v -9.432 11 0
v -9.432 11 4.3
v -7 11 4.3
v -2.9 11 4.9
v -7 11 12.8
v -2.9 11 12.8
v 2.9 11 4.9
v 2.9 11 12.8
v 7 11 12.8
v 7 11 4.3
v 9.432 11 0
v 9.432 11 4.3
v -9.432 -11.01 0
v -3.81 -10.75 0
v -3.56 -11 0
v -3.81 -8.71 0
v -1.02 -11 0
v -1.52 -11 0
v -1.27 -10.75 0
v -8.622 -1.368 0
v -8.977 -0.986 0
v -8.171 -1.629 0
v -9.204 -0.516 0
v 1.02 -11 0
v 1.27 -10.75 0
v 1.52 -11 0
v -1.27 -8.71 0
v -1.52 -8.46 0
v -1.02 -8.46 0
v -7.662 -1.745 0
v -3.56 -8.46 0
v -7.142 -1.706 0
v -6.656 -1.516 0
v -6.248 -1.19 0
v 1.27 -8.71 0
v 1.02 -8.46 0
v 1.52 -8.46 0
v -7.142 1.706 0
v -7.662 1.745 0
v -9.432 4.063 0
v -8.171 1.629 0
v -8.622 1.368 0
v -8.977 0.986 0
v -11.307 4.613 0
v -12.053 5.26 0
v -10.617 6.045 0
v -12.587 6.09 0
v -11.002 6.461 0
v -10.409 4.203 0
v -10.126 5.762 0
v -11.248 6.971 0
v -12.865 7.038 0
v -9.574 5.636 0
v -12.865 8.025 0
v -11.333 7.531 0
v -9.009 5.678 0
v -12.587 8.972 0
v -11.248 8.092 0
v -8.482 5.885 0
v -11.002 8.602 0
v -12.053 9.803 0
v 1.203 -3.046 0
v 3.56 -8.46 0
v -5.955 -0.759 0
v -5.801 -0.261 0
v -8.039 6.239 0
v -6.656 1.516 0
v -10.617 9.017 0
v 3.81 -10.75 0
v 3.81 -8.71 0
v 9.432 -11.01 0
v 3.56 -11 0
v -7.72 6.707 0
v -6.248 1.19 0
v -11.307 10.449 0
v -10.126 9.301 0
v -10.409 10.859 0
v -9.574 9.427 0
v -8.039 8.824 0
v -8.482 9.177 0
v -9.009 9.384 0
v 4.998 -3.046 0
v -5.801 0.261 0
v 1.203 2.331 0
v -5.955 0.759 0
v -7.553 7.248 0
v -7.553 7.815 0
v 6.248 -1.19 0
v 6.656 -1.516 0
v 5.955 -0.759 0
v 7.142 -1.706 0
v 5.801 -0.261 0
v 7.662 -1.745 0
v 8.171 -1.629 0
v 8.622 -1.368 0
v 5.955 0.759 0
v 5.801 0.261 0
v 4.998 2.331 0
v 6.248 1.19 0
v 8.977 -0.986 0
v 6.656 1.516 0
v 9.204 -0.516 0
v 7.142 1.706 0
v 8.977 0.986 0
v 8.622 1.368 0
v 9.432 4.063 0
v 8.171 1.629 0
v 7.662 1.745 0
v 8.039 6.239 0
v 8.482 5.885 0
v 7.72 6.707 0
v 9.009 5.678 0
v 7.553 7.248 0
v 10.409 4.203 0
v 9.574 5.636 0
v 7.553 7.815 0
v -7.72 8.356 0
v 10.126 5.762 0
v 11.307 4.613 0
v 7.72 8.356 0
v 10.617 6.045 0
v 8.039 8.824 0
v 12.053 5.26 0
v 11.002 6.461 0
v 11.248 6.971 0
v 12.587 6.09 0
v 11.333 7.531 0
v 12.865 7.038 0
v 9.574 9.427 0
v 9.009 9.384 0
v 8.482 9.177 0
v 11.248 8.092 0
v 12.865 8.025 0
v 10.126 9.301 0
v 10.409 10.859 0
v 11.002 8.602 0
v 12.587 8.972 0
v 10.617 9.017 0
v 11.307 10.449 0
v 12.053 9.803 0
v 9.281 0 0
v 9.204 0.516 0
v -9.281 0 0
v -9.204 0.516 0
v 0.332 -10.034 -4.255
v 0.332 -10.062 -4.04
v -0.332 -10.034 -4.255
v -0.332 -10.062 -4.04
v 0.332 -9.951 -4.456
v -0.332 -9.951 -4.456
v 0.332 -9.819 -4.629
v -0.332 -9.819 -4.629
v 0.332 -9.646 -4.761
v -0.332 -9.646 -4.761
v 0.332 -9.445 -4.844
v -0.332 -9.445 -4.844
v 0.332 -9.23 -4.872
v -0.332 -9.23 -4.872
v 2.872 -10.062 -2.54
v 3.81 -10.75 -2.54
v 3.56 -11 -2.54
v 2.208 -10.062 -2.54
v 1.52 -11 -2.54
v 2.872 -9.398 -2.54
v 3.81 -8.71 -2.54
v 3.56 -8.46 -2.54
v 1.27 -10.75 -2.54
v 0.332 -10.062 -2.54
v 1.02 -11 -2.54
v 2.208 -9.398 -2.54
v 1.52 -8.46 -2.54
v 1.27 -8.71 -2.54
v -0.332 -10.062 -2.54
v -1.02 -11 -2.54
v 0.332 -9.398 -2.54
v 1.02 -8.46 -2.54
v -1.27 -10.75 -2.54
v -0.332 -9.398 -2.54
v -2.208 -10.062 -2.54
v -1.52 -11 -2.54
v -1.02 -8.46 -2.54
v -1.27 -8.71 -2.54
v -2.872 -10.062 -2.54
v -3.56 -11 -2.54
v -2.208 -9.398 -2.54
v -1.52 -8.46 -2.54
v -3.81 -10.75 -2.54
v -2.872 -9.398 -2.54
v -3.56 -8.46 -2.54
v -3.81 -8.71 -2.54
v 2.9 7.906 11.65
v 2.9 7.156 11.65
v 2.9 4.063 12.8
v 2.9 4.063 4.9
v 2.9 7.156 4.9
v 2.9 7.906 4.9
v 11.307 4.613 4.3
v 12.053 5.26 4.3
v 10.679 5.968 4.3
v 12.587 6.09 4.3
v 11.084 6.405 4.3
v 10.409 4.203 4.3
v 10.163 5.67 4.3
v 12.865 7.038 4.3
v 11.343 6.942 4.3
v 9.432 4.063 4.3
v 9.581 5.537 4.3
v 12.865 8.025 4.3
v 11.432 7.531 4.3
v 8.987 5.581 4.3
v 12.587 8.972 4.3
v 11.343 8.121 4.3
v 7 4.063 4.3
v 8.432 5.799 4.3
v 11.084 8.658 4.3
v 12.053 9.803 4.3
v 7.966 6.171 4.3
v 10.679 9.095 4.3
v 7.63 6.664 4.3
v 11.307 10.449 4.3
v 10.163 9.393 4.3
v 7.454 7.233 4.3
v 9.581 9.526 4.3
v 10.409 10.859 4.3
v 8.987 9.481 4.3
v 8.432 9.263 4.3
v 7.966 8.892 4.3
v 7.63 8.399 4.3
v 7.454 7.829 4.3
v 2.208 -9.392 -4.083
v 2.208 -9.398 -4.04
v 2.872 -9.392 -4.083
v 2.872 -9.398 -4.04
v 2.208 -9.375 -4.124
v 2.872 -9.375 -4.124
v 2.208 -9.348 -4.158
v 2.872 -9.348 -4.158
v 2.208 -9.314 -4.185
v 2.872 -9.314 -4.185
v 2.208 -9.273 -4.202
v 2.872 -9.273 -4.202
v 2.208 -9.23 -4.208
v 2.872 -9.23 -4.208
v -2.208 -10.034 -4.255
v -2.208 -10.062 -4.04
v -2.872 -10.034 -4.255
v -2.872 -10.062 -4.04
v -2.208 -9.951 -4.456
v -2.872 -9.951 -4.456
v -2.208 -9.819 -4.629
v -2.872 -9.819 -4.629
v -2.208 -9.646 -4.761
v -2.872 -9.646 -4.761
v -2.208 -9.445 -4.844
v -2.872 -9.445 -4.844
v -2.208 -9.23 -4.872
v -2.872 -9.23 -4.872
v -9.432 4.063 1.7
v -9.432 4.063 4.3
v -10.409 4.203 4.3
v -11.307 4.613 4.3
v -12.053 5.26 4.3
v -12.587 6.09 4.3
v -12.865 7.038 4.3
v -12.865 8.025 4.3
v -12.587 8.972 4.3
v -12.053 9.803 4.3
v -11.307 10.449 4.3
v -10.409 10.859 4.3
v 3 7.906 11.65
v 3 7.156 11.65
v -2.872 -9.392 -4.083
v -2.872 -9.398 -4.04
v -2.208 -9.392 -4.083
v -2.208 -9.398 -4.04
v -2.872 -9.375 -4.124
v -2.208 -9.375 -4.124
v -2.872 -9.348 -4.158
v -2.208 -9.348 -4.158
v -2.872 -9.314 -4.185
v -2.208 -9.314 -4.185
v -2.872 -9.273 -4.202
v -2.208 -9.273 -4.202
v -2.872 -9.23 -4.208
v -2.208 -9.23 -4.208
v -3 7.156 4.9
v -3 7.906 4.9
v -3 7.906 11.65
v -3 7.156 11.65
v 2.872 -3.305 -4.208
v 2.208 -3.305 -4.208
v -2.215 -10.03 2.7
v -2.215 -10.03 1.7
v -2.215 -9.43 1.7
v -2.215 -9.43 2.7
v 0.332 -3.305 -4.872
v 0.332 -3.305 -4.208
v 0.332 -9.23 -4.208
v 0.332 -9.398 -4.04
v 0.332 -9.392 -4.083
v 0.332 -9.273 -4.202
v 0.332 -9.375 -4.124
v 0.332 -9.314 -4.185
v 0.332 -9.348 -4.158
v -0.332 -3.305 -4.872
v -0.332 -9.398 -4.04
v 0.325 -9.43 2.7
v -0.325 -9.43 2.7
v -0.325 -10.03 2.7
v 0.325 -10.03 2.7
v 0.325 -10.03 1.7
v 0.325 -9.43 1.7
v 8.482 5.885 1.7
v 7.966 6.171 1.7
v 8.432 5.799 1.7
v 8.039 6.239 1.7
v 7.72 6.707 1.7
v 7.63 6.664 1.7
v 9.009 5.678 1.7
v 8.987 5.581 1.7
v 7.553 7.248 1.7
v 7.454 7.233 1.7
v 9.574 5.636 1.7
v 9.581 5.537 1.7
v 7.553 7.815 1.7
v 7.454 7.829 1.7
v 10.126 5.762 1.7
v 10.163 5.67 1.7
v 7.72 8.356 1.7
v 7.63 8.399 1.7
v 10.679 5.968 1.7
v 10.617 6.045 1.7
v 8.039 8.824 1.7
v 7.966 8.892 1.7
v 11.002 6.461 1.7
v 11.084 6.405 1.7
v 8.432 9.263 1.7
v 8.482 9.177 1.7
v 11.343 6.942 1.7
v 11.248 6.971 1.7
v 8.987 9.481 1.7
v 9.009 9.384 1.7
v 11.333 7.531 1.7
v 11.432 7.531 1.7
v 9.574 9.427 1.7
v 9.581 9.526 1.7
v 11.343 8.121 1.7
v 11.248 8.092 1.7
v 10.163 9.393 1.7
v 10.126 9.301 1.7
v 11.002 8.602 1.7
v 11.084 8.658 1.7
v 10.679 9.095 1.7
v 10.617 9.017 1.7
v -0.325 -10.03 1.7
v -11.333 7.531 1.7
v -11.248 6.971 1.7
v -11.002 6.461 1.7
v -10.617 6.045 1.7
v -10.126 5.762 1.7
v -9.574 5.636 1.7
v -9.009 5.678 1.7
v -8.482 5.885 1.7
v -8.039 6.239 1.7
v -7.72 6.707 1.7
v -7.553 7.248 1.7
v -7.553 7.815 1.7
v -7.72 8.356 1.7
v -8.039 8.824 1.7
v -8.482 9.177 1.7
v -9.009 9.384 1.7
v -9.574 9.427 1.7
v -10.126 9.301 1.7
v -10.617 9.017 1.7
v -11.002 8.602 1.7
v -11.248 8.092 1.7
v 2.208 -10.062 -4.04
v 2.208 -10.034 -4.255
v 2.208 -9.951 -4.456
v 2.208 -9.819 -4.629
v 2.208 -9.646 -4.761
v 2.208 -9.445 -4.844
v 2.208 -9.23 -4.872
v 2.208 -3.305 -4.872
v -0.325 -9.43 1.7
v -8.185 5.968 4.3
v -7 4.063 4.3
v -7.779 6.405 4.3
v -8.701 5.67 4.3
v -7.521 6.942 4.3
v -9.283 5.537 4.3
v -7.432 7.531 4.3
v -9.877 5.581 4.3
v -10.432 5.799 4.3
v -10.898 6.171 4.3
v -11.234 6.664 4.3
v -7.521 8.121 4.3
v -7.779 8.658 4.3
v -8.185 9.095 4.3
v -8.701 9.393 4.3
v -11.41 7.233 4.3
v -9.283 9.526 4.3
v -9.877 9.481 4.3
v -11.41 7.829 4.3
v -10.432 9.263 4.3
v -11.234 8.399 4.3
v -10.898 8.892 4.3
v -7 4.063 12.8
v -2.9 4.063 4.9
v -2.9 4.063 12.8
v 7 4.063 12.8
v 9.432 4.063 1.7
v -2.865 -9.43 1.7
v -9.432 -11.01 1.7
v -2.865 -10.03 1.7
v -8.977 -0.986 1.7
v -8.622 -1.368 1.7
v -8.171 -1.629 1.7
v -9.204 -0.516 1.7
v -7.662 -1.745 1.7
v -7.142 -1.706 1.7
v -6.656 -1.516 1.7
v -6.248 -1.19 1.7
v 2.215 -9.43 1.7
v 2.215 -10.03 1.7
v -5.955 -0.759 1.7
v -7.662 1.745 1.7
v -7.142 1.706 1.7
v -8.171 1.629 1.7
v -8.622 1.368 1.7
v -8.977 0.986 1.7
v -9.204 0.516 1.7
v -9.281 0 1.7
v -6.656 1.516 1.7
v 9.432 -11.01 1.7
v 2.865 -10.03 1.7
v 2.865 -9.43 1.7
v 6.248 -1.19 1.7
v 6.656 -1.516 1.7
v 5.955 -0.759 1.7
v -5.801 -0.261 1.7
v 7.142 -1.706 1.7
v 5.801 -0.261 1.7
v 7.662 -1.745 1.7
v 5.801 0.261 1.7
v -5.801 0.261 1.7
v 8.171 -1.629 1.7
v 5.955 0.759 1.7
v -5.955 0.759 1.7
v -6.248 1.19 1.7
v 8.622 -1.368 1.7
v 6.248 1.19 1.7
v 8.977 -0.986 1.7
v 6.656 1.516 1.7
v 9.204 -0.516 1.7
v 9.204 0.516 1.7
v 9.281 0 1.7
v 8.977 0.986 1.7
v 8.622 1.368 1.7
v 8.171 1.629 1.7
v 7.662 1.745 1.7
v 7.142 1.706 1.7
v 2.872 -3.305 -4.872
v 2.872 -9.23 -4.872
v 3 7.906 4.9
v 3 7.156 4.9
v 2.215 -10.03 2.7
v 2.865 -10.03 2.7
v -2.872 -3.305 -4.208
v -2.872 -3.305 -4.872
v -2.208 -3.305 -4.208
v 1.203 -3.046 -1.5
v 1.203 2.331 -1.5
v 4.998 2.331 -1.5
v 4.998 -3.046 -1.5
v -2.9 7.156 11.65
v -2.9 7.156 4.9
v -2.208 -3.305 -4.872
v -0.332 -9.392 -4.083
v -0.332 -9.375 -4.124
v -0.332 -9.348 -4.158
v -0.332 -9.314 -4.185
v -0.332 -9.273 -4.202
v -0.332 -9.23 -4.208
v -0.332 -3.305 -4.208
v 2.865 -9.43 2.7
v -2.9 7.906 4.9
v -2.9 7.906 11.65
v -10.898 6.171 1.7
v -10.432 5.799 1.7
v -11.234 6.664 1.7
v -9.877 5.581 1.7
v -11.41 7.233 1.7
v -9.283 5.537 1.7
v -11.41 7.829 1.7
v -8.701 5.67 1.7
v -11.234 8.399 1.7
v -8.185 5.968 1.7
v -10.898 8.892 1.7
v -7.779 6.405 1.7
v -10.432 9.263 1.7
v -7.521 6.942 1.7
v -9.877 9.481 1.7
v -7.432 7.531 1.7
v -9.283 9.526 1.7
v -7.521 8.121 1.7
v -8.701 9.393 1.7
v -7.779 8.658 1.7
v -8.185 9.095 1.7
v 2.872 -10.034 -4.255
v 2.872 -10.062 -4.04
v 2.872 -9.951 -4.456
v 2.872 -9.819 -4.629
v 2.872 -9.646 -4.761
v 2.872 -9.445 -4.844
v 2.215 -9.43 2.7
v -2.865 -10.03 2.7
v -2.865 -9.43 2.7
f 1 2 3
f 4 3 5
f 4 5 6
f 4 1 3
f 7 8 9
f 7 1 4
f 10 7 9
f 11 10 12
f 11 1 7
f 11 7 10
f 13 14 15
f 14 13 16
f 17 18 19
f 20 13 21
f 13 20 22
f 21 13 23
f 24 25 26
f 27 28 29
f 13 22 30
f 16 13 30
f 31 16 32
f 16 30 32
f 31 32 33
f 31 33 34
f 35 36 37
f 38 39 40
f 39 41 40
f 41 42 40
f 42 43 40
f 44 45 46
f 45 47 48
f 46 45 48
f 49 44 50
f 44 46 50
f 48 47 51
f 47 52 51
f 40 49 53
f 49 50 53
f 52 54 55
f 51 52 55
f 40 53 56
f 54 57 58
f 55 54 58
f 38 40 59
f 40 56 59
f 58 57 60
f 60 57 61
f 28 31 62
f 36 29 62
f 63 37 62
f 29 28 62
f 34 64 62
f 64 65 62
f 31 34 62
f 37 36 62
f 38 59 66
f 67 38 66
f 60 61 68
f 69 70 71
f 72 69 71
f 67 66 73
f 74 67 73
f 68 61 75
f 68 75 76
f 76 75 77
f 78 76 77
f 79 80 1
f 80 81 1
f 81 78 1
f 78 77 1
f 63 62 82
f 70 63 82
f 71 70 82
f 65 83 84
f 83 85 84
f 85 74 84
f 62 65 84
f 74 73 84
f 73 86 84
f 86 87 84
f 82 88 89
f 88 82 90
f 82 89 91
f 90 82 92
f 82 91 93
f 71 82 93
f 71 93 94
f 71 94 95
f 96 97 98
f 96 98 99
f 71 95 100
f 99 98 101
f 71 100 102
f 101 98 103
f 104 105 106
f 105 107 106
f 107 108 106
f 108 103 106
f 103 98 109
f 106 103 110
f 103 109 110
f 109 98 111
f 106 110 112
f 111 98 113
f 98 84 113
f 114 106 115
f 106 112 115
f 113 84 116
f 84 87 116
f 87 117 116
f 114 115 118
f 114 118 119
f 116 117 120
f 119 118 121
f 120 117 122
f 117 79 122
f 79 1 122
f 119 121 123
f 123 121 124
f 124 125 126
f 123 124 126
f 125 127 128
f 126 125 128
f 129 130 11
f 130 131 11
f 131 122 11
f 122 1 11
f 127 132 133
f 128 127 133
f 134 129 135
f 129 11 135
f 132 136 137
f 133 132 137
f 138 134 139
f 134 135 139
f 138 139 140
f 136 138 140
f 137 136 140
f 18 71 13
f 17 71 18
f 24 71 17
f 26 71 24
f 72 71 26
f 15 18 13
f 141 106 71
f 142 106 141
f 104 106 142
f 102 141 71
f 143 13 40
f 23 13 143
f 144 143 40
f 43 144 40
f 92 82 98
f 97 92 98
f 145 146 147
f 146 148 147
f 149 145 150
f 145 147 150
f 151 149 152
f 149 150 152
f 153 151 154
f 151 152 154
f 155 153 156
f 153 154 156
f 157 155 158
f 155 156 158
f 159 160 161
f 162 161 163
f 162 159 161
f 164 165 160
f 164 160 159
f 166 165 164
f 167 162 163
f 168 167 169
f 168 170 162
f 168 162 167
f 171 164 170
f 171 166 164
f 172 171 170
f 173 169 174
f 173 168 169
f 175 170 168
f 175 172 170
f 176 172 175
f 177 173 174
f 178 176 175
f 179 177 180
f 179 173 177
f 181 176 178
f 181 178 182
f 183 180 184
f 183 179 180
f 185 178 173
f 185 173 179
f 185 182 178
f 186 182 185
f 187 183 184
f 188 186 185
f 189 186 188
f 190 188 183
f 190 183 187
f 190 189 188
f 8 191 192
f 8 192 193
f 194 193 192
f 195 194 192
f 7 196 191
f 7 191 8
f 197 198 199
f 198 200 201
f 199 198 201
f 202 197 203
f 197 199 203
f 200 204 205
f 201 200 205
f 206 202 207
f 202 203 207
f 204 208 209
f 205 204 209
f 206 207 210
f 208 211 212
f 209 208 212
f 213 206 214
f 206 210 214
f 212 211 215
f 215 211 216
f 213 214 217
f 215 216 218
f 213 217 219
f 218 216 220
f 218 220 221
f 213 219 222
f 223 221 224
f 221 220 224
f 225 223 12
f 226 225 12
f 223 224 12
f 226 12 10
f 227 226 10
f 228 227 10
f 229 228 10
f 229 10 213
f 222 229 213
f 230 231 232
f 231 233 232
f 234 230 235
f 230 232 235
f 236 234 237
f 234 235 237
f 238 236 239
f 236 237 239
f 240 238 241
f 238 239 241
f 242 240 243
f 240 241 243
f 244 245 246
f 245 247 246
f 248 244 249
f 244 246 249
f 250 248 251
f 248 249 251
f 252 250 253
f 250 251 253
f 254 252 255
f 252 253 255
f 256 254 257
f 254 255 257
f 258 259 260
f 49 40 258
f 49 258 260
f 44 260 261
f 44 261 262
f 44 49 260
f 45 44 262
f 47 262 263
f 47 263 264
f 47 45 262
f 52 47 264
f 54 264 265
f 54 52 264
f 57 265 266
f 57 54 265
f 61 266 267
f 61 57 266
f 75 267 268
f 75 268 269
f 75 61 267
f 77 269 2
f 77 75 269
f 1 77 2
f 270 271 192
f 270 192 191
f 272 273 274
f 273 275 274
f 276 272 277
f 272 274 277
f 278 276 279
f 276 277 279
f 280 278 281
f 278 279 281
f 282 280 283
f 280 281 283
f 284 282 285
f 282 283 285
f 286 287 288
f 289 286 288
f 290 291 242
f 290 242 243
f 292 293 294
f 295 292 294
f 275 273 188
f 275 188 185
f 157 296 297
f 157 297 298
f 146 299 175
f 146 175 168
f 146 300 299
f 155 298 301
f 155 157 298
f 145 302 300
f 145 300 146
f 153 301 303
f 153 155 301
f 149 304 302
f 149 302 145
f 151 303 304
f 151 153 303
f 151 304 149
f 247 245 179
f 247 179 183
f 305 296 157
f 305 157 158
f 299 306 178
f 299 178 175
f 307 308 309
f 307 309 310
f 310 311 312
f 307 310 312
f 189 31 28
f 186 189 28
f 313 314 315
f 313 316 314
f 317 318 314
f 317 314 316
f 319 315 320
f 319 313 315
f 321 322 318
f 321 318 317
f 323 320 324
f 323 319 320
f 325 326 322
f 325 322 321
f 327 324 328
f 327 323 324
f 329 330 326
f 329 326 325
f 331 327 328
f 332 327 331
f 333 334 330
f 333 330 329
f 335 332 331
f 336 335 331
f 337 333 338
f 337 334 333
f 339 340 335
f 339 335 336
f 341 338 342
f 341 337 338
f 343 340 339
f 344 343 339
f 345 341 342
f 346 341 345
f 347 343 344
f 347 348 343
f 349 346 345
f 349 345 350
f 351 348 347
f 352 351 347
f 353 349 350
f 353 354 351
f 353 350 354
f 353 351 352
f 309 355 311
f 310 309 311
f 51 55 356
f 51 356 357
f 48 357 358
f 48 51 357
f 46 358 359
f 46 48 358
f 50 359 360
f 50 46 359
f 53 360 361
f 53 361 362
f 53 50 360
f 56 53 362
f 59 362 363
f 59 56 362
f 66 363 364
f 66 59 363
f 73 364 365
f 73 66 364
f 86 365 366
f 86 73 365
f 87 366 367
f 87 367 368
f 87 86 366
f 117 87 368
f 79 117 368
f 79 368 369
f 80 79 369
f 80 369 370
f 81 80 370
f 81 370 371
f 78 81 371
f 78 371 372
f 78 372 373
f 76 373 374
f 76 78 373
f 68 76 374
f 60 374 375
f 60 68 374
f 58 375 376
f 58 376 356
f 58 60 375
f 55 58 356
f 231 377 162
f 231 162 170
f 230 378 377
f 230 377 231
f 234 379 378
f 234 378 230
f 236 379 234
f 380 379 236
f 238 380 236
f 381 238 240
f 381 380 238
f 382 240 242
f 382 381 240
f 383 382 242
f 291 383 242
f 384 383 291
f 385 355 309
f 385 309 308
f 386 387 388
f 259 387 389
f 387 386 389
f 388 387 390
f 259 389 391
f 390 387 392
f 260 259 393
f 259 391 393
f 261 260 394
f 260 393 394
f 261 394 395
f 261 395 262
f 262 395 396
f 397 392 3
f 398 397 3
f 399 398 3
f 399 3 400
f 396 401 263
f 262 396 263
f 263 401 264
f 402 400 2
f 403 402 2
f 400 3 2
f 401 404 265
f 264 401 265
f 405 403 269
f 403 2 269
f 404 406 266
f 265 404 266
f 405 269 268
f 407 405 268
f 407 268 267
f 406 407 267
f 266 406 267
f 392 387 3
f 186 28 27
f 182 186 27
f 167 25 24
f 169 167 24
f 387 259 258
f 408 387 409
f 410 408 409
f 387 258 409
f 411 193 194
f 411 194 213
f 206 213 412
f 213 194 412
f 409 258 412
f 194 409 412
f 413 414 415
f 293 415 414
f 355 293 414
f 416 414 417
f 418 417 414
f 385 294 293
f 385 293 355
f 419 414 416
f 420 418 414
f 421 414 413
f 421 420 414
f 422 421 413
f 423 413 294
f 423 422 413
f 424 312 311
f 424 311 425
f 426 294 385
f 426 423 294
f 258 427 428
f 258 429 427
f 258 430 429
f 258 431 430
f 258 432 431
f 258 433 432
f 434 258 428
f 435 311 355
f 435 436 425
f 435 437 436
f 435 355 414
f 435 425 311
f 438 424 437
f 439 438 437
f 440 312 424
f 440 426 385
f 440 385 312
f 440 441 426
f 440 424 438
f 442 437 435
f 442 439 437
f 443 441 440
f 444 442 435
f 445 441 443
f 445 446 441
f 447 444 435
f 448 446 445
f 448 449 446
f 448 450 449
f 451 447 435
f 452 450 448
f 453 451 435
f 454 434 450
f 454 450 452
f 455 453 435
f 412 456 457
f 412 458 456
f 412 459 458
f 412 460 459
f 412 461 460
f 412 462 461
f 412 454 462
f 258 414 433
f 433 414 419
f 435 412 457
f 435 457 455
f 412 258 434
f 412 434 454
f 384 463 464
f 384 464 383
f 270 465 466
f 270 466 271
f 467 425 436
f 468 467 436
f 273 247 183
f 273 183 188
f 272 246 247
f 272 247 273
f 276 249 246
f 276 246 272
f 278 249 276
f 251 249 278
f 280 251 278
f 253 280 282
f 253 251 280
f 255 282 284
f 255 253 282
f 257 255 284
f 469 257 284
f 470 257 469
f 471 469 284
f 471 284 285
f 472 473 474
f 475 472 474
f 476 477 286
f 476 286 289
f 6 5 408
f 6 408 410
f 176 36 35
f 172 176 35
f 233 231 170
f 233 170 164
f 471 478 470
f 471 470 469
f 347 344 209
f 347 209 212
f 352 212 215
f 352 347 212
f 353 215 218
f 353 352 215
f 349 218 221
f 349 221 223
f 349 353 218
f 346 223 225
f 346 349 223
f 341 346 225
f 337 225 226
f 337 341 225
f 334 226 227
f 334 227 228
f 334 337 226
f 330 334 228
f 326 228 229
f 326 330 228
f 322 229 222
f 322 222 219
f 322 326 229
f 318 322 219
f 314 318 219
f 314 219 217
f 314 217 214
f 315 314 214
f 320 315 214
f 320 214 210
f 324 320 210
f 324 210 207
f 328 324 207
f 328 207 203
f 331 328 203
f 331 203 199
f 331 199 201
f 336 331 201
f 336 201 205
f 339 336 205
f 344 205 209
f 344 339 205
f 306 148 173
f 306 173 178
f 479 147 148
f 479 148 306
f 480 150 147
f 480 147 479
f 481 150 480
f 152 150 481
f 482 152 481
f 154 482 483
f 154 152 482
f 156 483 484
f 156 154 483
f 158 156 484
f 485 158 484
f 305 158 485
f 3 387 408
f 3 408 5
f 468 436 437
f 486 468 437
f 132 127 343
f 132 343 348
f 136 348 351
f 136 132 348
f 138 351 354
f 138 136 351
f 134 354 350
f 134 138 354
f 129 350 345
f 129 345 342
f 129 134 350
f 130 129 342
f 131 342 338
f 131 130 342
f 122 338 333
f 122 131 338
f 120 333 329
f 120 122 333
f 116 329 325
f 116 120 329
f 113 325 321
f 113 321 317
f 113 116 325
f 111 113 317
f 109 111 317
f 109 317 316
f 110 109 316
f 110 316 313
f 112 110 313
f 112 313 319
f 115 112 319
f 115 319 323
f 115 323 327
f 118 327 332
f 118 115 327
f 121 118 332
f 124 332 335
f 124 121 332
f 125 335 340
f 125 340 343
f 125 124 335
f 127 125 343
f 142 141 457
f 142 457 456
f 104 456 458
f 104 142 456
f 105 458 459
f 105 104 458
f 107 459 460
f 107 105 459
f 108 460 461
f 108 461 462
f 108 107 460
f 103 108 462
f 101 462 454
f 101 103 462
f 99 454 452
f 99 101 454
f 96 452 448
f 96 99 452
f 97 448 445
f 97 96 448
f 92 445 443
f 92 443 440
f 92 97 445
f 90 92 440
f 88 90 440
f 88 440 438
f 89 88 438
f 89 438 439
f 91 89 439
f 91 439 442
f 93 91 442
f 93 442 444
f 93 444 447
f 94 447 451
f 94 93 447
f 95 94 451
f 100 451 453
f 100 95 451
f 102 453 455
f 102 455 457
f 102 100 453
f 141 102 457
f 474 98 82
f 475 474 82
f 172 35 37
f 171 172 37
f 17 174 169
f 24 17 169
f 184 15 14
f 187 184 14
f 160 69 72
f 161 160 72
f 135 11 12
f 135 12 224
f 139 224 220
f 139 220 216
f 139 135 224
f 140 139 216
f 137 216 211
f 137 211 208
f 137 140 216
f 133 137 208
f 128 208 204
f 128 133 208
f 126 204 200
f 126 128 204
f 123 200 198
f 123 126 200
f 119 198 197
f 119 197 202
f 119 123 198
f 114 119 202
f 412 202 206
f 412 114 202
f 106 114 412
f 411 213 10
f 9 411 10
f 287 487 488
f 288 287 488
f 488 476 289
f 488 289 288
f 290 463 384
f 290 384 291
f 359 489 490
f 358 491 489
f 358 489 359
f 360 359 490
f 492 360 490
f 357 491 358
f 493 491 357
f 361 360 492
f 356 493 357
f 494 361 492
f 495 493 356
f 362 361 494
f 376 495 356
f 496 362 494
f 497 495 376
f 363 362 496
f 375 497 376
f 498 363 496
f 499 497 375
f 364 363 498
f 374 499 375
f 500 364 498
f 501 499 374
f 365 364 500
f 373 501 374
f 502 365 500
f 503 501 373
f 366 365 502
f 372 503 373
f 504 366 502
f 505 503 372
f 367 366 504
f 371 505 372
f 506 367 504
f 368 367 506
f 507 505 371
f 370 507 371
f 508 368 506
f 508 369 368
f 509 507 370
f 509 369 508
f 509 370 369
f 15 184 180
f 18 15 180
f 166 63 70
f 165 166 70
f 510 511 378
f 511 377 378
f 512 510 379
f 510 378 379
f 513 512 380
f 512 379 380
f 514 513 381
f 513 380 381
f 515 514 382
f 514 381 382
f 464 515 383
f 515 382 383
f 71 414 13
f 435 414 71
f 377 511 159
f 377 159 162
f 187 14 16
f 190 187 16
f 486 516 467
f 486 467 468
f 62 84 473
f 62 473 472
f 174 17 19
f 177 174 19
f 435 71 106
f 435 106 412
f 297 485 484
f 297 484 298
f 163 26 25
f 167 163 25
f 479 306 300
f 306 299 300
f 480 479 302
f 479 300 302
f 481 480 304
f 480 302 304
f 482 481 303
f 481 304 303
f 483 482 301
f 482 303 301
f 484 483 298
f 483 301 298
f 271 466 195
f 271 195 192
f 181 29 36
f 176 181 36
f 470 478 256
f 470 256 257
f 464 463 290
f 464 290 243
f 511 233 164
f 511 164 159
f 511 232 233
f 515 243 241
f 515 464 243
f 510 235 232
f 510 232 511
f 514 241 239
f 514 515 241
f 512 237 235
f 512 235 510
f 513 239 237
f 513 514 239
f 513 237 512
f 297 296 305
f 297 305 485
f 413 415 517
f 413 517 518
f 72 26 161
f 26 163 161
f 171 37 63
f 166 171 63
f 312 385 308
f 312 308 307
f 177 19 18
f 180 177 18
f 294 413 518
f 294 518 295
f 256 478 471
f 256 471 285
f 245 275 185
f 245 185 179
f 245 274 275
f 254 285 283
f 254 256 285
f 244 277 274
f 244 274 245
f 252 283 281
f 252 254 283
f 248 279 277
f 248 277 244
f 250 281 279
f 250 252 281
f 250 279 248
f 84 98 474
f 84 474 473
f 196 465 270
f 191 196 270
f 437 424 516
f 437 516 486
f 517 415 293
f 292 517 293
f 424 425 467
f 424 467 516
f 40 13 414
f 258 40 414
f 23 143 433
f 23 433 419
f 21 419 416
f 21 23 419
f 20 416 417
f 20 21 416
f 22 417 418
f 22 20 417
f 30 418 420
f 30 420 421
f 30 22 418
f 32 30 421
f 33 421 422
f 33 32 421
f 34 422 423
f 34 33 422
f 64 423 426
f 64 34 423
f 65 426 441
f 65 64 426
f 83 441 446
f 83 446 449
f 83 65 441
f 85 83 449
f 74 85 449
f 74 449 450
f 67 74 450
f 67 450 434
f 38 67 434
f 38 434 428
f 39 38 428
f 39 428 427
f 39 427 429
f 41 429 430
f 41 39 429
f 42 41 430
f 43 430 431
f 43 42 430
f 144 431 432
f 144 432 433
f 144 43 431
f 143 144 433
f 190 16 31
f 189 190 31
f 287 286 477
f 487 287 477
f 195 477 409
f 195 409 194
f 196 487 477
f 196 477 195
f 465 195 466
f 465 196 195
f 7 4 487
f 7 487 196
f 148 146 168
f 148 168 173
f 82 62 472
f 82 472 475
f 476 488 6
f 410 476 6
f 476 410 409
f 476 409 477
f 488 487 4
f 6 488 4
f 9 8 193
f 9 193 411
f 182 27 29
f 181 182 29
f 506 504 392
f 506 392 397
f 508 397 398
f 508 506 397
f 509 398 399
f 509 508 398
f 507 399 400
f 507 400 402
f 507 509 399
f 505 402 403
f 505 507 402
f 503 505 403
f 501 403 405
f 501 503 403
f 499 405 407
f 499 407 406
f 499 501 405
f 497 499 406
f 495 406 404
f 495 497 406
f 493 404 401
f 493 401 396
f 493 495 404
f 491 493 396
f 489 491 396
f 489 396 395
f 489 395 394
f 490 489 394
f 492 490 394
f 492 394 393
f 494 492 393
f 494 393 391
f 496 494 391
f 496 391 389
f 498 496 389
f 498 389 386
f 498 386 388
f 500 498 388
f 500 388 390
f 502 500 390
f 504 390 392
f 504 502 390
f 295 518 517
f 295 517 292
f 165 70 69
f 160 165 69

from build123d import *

# Parameters (mm, degrees)
IZIM1_R                     = 1.900647948
IZIM1_R_2                   = 1.75
Y_KSEKLIK_EKSTR_ZYON1_DEPTH = 1.7
IZIM2_R                     = 2
Y_KSEKLIK_EKSTR_ZYON2_DEPTH = 2.6
IZIM3_W                     = 4.100055298
IZIM3_H                     = 6.937365011
Y_KSEKLIK_EKSTR_ZYON3_DEPTH = 8.5
IZIM4_W                     = 5.8
IZIM4_H                     = 6.937365011
Y_KSEKLIK_EKSTR_ZYON4_DEPTH = 0.6
Y_KSEKLIK_EKSTR_ZYON6_DEPTH = 2.54
IZIM6_W                     = 18.863930886
IZIM6_H                     = 1.7
Y_KSEKLIK_EKSTR_ZYON7_DEPTH = 0.01
KES_EKSTR_ZYON1_DEPTH       = 5.9
KES_EKSTR_ZYON1_DEPTH_BACK  = 0.1
IZIM7_W                     = 6.75
IZIM7_H                     = 0.75
IZIM8_W                     = 0.664910116
IZIM8_H                     = 0.664910116
IZIM11_W                    = 0.65
IZIM11_H                    = 0.6
Y_KSEKLIK_EKSTR_ZYON8_DEPTH = 1
Y_KSEKLIK_EKSTR_ZYON9_DEPTH = 1.5


with BuildPart() as part:
    # Çizim1 → Yükseklik-Ekstrüzyon1 (new body)
    with BuildSketch(Plane.XY):
        with BuildLine():
            Line((-9.431965443, -11), (9.431965443, -11))
            Line((9.431965443, -11), (9.431965443, 4.062634989))
            ThreePointArc((9.431965443, 4.062634989), (12.900647948, 7.531317495), (9.431965443, 11))
            Line((9.431965443, 11), (-9.431965443, 11))
            ThreePointArc((-9.431965443, 11), (-12.900647948, 7.531317495), (-9.431965443, 4.062634989))
            Line((-9.431965443, 4.062634989), (-9.431965443, -11))
        make_face()
        with Locations((9.431965443, 7.531317495)):
            Circle(IZIM1_R, mode=Mode.SUBTRACT)
        with Locations(Location((-9.431965443, 7.531317495, 0), (0, 0, 180))):
            Circle(IZIM1_R, mode=Mode.SUBTRACT)
        with Locations((7.531317495, 0)):
            Circle(IZIM1_R_2, mode=Mode.SUBTRACT)
        with Locations(Location((-7.531317495, 0, 0), (0, 0, 180))):
            Circle(IZIM1_R_2, mode=Mode.SUBTRACT)
    extrude(amount=Y_KSEKLIK_EKSTR_ZYON1_DEPTH)

    # Çizim2 → Yükseklik-Ekstrüzyon2 (add)
    with BuildSketch(Plane.XY.offset(1.7)):
        with BuildLine():
            Line((-9.431965443, 11), (9.431965443, 11))
            ThreePointArc((9.431965443, 11), (12.900647948, 7.531317495), (9.431965443, 4.062634989))
            Line((9.431965443, 4.062634989), (-9.431965443, 4.062634989))
            ThreePointArc((-9.431965443, 4.062634989), (-12.900647948, 7.531317495), (-9.431965443, 11))
        make_face()
        with Locations((-9.431965443, 7.531317495)):
            Circle(IZIM2_R, mode=Mode.SUBTRACT)
        with Locations((9.431965443, 7.531317495)):
            Circle(IZIM2_R, mode=Mode.SUBTRACT)
    extrude(amount=Y_KSEKLIK_EKSTR_ZYON2_DEPTH)

    # Çizim3 → Yükseklik-Ekstrüzyon3 (add)
    with BuildSketch(Plane.XY.offset(4.3)):
        with Locations((4.950027649, 7.531317494)):
            Rectangle(IZIM3_W, IZIM3_H)
        with Locations((-4.950027649, 7.531317494)):
            Rectangle(IZIM3_W, IZIM3_H)
    extrude(amount=Y_KSEKLIK_EKSTR_ZYON3_DEPTH)

    # Çizim4 → Yükseklik-Ekstrüzyon4 (add)
    with BuildSketch(Plane.XY.offset(4.3)):
        with Locations((0, 7.531317494)):
            Rectangle(IZIM4_W, IZIM4_H)
    extrude(amount=Y_KSEKLIK_EKSTR_ZYON4_DEPTH)

    # Çizim5 → Yükseklik-Ekstrüzyon6 (add)
    with BuildSketch(Plane(origin=(0, 0, 0), x_dir=(-1, 0, 0), z_dir=(0, 0, -1))):
        Polygon((-1.27, -10.75), (-1.27, -8.71), (-1.52, -8.46), (-3.56, -8.46), (-3.81, -8.71), (-3.81, -10.75), (-3.56, -11), (-1.52, -11), align=None)
        Polygon((1.27, -8.71), (1.02, -8.46), (-1.02, -8.46), (-1.27, -8.71), (-1.27, -10.75), (-1.02, -11), (1.02, -11), (1.27, -10.75), align=None)
        Polygon((1.52, -8.46), (1.27, -8.71), (1.27, -10.75), (1.52, -11), (3.56, -11), (3.81, -10.75), (3.81, -8.71), (3.56, -8.46), align=None)
    extrude(amount=Y_KSEKLIK_EKSTR_ZYON6_DEPTH)

    # Çizim6 → Yükseklik-Ekstrüzyon7 (add)
    with BuildSketch(Plane.XZ.offset(11)):
        with Locations((0, 0.85)):
            Rectangle(IZIM6_W, IZIM6_H)
    extrude(amount=Y_KSEKLIK_EKSTR_ZYON7_DEPTH)

    # Çizim7 → Kes-Ekstrüzyon1 (cut, two sides: drawn at the far end of the back side and taken through both)
    with BuildSketch(Plane.ZY.offset(-2.9).offset(-KES_EKSTR_ZYON1_DEPTH_BACK)):
        with Locations((8.275, 7.531317495)):
            Rectangle(IZIM7_W, IZIM7_H)
    extrude(amount=KES_EKSTR_ZYON1_DEPTH + KES_EKSTR_ZYON1_DEPTH_BACK, mode=Mode.SUBTRACT)

    # Süpür1: sweep along a path in Çizim9
    with BuildLine(Plane(origin=(0, 0, 0), x_dir=(0, 0, -1), z_dir=(1, 0, 0))) as s_p_r1_path:
        Line((2.54, -9.73), (4.04, -9.73))
        ThreePointArc((4.04, -9.73), (4.393553391, -9.583553391), (4.54, -9.23))
        Line((4.54, -9.23), (4.54, -3.305))
    # Çizim8 → Süpür1 (sweep)
    with BuildSketch(Plane(origin=(0, 0, -2.54), x_dir=(-1, 0, 0), z_dir=(0, 0, -1))):
        with Locations((2.54, -9.73)):
            Rectangle(IZIM8_W, IZIM8_H)
        with Locations((0, -9.73)):
            Rectangle(IZIM8_W, IZIM8_H)
        with Locations((-2.54, -9.73)):
            Rectangle(IZIM8_W, IZIM8_H)
    sweep(path=s_p_r1_path.line)

    # Çizim11 → Yükseklik-Ekstrüzyon8 (add)
    with BuildSketch(Plane.XY.offset(1.7)):
        with Locations((-2.54, -9.73)):
            Rectangle(IZIM11_W, IZIM11_H)
        with Locations((0, -9.73)):
            Rectangle(IZIM11_W, IZIM11_H)
        with Locations((2.54, -9.73)):
            Rectangle(IZIM11_W, IZIM11_H)
    extrude(amount=Y_KSEKLIK_EKSTR_ZYON8_DEPTH)

    # Çizim12 → Yükseklik-Ekstrüzyon9 (add)
    with BuildSketch(Plane(origin=(0, 0, 0), x_dir=(-1, 0, 0), z_dir=(0, 0, -1))):
        Polygon((-4.998159683, 0), (-4.998159683, 2.331223734), (-1.20341454, 2.331223734), (-1.20341454, -3.045965908), (-4.998159683, -3.045965908), align=None)
    extrude(amount=Y_KSEKLIK_EKSTR_ZYON9_DEPTH)


solid = part.part
